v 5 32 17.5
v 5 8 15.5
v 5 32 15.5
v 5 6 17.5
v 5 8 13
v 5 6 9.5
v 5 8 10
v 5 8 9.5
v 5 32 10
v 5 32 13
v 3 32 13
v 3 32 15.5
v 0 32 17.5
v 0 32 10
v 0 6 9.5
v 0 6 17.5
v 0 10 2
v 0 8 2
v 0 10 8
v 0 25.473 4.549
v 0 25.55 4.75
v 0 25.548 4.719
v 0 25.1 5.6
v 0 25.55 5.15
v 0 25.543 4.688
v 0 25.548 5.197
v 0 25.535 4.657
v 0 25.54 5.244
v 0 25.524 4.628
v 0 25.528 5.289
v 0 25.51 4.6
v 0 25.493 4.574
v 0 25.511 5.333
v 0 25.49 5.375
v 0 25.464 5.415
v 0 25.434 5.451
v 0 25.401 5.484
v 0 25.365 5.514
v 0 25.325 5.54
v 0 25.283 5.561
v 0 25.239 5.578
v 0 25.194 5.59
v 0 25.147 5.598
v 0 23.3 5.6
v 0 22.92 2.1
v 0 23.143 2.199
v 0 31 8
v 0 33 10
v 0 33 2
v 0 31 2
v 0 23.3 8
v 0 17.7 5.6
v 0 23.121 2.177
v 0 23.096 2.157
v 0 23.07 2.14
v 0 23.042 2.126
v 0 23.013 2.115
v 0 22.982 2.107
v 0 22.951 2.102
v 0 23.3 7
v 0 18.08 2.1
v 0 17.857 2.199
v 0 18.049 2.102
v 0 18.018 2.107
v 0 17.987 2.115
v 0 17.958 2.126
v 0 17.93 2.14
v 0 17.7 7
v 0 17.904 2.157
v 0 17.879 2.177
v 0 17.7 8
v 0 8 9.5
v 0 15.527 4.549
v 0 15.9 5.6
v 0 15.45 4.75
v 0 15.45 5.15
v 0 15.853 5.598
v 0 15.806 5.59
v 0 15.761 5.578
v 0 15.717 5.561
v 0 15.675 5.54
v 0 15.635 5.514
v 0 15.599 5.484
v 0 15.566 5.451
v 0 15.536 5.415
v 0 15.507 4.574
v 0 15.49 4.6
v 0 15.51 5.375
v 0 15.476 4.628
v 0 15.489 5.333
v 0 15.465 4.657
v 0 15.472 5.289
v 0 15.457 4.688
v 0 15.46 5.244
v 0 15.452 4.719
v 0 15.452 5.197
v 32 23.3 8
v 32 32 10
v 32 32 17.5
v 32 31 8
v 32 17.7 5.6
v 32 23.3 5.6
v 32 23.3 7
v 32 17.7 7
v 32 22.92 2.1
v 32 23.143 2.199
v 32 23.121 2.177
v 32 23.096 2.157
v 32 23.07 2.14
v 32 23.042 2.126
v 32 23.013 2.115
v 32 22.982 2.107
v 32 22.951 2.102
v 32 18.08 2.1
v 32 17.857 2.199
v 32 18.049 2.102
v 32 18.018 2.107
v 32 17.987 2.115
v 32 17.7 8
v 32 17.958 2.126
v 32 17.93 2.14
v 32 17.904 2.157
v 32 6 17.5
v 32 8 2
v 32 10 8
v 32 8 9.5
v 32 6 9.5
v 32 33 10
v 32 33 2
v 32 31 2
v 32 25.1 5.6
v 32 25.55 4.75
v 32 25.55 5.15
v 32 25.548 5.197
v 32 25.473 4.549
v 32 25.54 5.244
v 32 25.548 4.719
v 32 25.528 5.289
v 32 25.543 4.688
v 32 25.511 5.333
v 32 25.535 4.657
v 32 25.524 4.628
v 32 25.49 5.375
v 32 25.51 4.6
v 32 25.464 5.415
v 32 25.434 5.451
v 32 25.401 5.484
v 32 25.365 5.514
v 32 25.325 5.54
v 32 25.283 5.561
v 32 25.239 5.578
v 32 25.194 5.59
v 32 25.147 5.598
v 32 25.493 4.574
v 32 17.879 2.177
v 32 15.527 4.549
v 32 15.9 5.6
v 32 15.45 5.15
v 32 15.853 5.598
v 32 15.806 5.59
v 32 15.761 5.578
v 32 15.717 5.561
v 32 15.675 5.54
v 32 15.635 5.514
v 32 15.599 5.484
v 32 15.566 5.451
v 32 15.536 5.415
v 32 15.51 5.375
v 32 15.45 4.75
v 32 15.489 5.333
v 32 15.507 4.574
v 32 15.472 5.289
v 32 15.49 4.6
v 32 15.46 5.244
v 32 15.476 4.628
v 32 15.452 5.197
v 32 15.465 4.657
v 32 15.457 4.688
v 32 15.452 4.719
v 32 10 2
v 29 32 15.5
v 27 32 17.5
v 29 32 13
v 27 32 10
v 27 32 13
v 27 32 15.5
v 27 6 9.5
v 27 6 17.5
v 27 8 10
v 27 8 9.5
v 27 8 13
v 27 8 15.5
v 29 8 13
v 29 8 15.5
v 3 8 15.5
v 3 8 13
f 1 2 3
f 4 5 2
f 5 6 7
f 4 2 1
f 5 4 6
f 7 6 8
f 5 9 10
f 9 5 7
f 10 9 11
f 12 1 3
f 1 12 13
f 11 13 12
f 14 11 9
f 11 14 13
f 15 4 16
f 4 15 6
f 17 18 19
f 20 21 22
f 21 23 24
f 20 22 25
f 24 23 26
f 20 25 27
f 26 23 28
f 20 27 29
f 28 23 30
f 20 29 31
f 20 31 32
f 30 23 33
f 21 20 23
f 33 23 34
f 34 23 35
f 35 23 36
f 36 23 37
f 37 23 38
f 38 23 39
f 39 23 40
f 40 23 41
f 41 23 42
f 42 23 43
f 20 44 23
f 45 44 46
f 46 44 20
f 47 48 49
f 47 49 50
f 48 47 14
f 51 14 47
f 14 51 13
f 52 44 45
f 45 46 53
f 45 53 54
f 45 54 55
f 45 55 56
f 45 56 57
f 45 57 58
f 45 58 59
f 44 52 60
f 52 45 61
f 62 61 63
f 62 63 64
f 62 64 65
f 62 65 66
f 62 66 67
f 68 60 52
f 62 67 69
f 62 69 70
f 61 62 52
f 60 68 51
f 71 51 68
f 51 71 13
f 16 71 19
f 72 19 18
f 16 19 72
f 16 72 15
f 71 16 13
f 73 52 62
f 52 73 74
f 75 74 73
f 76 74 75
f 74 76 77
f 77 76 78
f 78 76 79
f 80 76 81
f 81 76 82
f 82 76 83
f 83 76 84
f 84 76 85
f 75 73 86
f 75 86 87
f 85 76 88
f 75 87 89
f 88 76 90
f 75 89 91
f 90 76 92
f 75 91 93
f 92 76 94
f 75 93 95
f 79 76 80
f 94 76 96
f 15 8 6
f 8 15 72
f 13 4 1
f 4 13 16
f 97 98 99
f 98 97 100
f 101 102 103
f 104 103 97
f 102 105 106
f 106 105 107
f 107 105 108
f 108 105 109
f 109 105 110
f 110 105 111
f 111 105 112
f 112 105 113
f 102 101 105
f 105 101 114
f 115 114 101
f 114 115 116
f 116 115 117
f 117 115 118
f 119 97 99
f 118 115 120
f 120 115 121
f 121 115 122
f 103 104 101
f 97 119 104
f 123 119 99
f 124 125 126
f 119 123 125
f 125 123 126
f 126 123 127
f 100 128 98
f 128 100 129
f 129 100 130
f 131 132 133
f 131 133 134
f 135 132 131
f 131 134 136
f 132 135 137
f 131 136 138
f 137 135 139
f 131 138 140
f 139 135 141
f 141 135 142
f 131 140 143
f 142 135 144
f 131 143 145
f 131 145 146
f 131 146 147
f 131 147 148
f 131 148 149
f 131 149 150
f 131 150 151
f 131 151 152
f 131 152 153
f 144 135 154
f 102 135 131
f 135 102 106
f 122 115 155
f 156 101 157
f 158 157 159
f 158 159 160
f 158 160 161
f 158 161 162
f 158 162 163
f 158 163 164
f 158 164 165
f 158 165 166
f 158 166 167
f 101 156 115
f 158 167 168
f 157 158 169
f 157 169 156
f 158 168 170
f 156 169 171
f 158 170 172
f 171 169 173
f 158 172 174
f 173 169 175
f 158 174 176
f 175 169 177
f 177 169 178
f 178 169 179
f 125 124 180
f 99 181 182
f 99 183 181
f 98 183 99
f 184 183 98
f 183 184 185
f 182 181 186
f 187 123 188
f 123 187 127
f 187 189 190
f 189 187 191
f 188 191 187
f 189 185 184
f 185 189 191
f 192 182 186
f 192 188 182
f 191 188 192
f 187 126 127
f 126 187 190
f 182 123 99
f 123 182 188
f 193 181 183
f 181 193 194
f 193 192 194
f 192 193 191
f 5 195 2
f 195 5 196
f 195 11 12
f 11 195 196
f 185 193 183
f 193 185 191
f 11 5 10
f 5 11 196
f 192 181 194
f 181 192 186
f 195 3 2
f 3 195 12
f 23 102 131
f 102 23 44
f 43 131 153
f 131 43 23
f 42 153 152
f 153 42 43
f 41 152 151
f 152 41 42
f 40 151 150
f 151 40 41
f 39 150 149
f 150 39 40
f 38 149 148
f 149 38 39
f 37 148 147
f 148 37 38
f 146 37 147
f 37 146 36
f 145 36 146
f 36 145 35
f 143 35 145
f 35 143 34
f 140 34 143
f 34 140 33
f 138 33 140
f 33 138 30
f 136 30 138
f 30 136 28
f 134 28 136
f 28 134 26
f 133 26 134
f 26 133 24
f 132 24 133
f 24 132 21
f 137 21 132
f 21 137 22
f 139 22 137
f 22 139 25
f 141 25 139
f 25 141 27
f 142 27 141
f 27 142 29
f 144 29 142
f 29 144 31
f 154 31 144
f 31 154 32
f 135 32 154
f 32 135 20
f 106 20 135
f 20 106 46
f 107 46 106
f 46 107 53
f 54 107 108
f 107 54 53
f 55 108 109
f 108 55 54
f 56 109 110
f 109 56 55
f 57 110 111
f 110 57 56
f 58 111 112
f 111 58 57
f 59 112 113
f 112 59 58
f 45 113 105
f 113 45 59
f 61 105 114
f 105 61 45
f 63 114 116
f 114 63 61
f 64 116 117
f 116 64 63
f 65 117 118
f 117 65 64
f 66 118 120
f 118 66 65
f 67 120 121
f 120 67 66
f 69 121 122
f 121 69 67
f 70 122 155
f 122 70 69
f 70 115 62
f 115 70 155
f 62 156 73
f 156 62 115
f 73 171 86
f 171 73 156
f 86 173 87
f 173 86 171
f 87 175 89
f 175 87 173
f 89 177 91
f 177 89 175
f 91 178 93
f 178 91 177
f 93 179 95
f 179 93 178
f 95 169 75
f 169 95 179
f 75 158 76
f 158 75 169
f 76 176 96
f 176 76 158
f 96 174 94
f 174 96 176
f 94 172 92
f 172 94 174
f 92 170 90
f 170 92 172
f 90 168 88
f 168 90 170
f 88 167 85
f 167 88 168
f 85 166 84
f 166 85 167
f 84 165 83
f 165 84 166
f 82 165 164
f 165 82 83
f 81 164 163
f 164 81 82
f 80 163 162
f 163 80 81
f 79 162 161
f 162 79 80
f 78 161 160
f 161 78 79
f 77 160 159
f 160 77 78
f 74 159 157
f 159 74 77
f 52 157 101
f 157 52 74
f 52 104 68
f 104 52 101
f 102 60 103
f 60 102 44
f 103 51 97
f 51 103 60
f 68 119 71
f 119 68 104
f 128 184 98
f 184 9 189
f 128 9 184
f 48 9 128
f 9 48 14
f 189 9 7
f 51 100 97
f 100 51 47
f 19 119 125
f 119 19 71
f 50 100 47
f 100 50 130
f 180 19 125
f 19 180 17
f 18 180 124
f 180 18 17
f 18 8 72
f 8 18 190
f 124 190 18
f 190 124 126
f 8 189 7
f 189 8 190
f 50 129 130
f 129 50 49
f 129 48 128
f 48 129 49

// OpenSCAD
/*
To Use by Step.

1. Chose type by comment out.
2. Render(F6)
3. Export STL(F7)

*/

// ------------------------------------------
// Select one for Joint Type!
// basic
// type="single";
// for Real Device Tap System
// type="frame_200";
// type="frame_100";
// type="frame_70";
// type="single_taphole";
// type="twin";
// type="twin_ex";
// type="triple_right";
// type="triple_left";
// type="plate_75";
// type="plate_90";
// type="plate_90_ex";
// type="back_plate";
// type="back_plate_0";
// type="shaft_holder";
// type="shaft_cap";
// type="shaft_cap2";
// for TPU fill
// type="ajaster";
// type="hole_twin";
// type="hole_single";
// for Option
// type="single_long";
// type="single_3hock";
// type="frame_200";
// type="alt_parts";
// type="moni_parts";
// type="moni_parts_top";
type="moni_parts_camera";

// ------------------------------------------

echo(version=version());
// Base Config
base_W = 14;
base_H = 14;
base_T = 5;
$fn = 60;

if (type=="single") {
    make_single_cap();
} else if (type=="twin") {
    make_single_cap(0);
    translate([0, -10, -10]) rotate([90, 180, 0]) make_single_cap(0);
    hull(){
        translate([0, 0, -3]) linear_extrude(height=1) make_2D_base();
        translate([0, -7, -10]) rotate([90, 180, 0]) linear_extrude(height=1) make_2D_base();
    }
} else if (type=="twin_ex") {
    make_single_cap(0);
    translate([0, -17, -10]) rotate([90, 180, 0]) make_single_cap(0);
    hull(){
        translate([0, 0, -3]) linear_extrude(height=1) make_2D_base();
        translate([0, -7, -10]) rotate([90, 180, 0]) linear_extrude(height=1) make_2D_base();
    }
    hull(){
        translate([0, -7, -10]) rotate([90, 180, 0]) linear_extrude(height=1) make_2D_base();
        #translate([0, -14, -10]) rotate([90, 180, 0]) linear_extrude(height=1) make_2D_base();
    }
} else if (type=="triple_right") {
    make_single_cap(0);
    translate([0, -10, -10]) rotate([90, 180, 0]) make_single_cap(0);
    translate([12.6, 0, -9.65]) rotate([0, -75, 180]) make_single_cap();
    hull(){
        translate([0, 0, -3]) linear_extrude(height=1) make_2D_base();
        translate([0, -7, -10]) rotate([90, 180, 0]) linear_extrude(height=1) make_2D_base();
        translate([9.5, 0, -10.5]) rotate([0, -75, 180]) linear_extrude(height=1) make_2D_base();
    }
} else if (type=="triple_left") {
    make_single_cap(0);
    translate([0, -10, -10]) rotate([90, 180, 0]) make_single_cap(0);
    translate([-12.6, 0, -9.65]) rotate([0, -75, 0]) make_single_cap();
    hull(){
        translate([0, 0, -3]) linear_extrude(height=1) make_2D_base();
        translate([0, -7, -10]) rotate([90, 180, 0]) linear_extrude(height=1) make_2D_base();
        translate([-9.5, 0, -10.5]) rotate([0, -75, 0]) linear_extrude(height=1) make_2D_base();
    }
} else if (type=="plate_75") {
    make_plate(75,-2.075,-4.225,-2.6,-0.3);
} else if (type=="plate_90") {
    make_plate(90);
} else if (type=="plate_90_ex") {
    make_plate(90,0,0,0,0,7);
} else if (type=="single_long") {
    make_single_cap(0,20,20,20);
} else if (type=="single_3hock") {
    make_single_cap(0);
} else if (type=="single_taphole") {
    difference(){
        make_single_cap(0, 15, 0, 15);
        translate([0, 0, -8]) cylinder(h=10, r=2.6);
        translate([0, 0, -8]) cylinder(h=5, r=4.6);
        hull(){
            translate([0, 0, -4]) cylinder(h=0.1, r=4.6);
            translate([0, 0, -5.1]) cylinder(h=0.1, r=5.6);
        }
    }

} else if (type=="back_plate") {
    union() {
        depth=7;
        translate([0, 0, depth]) difference(){
            cube([20, 70, 3]);
            union() {
                // holes
                translate([10, 10, -0.5]) cylinder(h=4, r=3.2);
                translate([10, 60, -0.5]) cylinder(h=4, r=3.2);
            }
        }
        translate([120, 0, depth]) difference(){
            cube([20, 70, 3]);
            union() {
                // holes
                translate([10, 10, -0.5]) cylinder(h=4, r=3.2);
                translate([10, 60, -0.5]) cylinder(h=4, r=3.2);
            }
        }

        translate([20, 0, 0]) cube([3, 70, 3+depth]);
        translate([117, 0, 0]) cube([3, 70, 3+depth]);

        difference(){
            // main body
            translate([20, 0, 0]) cube([100, 70, 3]);

            //pattern block
            translate([0, 0, 0]) make_hole_pattern(5);
            translate([10, 10, 0]) make_hole_pattern(4);
            translate([0, 20, 0]) make_hole_pattern(5);
            translate([10, 30, 0]) make_hole_pattern(4);
            translate([0, 40, 0]) make_hole_pattern(5);
        }
        // hock block
        translate([80, 0, 0]) make_hock();
        translate([32, 0, 0]) make_hock();
    }
} else if (type=="back_plate_0") {
    union() {
        depth=0;
        translate([0, 0, depth]) difference(){
            cube([20, 70, 3]);
            union() {
                // holes
                translate([10, 10, -0.5]) cylinder(h=4, r=3.2);
                translate([10, 60, -0.5]) cylinder(h=4, r=3.2);
            }
        }
        translate([120, 0, depth]) difference(){
            cube([20, 70, 3]);
            union() {
                // holes
                translate([10, 10, -0.5]) cylinder(h=4, r=3.2);
                translate([10, 60, -0.5]) cylinder(h=4, r=3.2);
            }
        }

        translate([20, 0, 0]) cube([3, 70, 3+depth]);
        translate([117, 0, 0]) cube([3, 70, 3+depth]);

        difference(){
            // main body
            translate([20, 0, 0]) cube([100, 70, 3]);

            //pattern block
            translate([0, 0, 0]) make_hole_pattern(5);
            translate([10, 10, 0]) make_hole_pattern(4);
            translate([0, 20, 0]) make_hole_pattern(5);
            translate([10, 30, 0]) make_hole_pattern(4);
            translate([0, 40, 0]) make_hole_pattern(5);
        }
    }
} else if (type=="shaft_holder") {
    union(){
        // main body
        translate([0, 0, -0.5]) difference(){
            union(){
                // base plate
                translate([0, 0, 0]) cube([39, 20, 1.5], center=true);
                // fill body
                hull() {
                    translate([0, 0, 9.8]) cube([22, 20, 0.1], center=true);
                    translate([0, 0, 0.5]) cube([16, 20, 0.1], center=true);
                }
                // shaft caps
                translate([-13.5, 0, 0]) union(){
                    make_shaft_cap();
                    translate([27, 0, 0]) make_shaft_cap();
                }
            }
            // center hole
            translate([0, 0, -3]) cylinder(h=22, r=3.4);
        }
        // dabo
        translate([-12, 0, -1]) make_DABO();
        translate([12, 0, -1]) make_DABO();
    }
} else if (type=="frame_70") {
    make_frame(height=70);
} else if (type=="frame_100") {
    make_frame(height=100);
} else if (type=="frame_200") {
    make_frame(height=200);
} else if (type=="ajaster") {
    make_ajaster();
} else if (type=="shaft_cap") {
    union(){
        difference() {
            union(){
                translate([0, 0, 0.7]) cube([20,15,13], center=true);
                translate([0, 13.5, 0]) difference() {
                    hull(){
                        translate([0, -6, 0.7]) cube([20,0.1,13], center=true);
                        translate([0, 0, 0]) rotate([90, 0, 90]) cylinder(h=17, r=5.8, center=true);
                    }
                    translate([0, 0, 0]) rotate([90, 0, 90]) cylinder(h=32, r=3.2, center=true);
                }
                translate([0, -13.5, 0]) difference() {
                    hull(){
                        translate([0, 6, 0.7]) cube([20,0.1,13], center=true);
                        translate([0, 0, 0]) rotate([90, 0, 90]) cylinder(h=17, r=5.8, center=true);
                    }
                    translate([0, 0, 0]) rotate([90, 0, 90]) cylinder(h=32, r=3.2, center=true);
                }
            }
            translate([0, 0, 0.7]) union(){
                cylinder(h=15, r=2.6, center=true);
                translate([0, 0, -2]) cylinder(h=11, r=7.7, center=true);
            }
        }
    }
} else if (type=="shaft_cap2") {
    union(){
        difference() {
            union(){
                translate([0, 0, 0.7]) cube([20,15,13], center=true);
                translate([0, 13.5, 0]) difference() {
                    hull(){
                        translate([0, -6, 0.7]) cube([20,0.1,13], center=true);
                        translate([0, 0, 0]) rotate([90, 0, 90]) cylinder(h=17, r=5.8, center=true);
                    }
                    translate([0, 0, 0]) rotate([90, 0, 90]) cylinder(h=32, r=3.4, center=true);
                }
                translate([0, -13.5, 0]) difference() {
                    hull(){
                        translate([0, 6, 0.7]) cube([20,0.1,13], center=true);
                        translate([0, 0, 0]) rotate([90, 0, 90]) cylinder(h=17, r=5.8, center=true);
                    }
                    translate([0, 0, 0]) rotate([90, 0, 90]) cylinder(h=32, r=3.4, center=true);
                }
                translate([0, 0, 5.7]) cube([10,24,3], center=true);
            }

                translate([0, 7, 0.7]) union(){
                    cylinder(h=15, r=2.8, center=true);
                    translate([0, 0, -6]) cylinder(h=2, r=7.7, center=true);
                }
                translate([0, -7, 0.7]) union(){
                    cylinder(h=15, r=2.8, center=true);
                    translate([0, 0, -6]) cylinder(h=2, r=7.7, center=true);
                }
                translate([0, 0, -5.8]) cube([15.4,15,3], center=true);
                translate([0, 0, 2]) cube([5.6,15,13], center=true);

        }
    }} else if (type=="hole_twin") {
    // twin type
    translate([0, 0, 0]) union(){
        difference() {
            // main body
            intersection(){
                translate([0, 0, 0]) cube([base_H*2-3, base_W, base_T], center=true);
                union(){
                    translate([6, 0, 0]) cylinder(r=8.5, h=7, center=true);
                    translate([-6, 0, 0]) cylinder(r=8.5, h=7, center=true);
                    translate([0, 0, 0]) cube([base_H+2, base_W+2, base_T+2], center=true);
                }
            }
            // hole
            translate([7, 0, -0.5]) padhole();
            translate([-6, -1.2, -0.5]) rotate([0, 0, 90]) padhole();
        }
        translate([0, 0, 2]) make_ajaster();
    }
} else if (type=="hole_single") {
    // single type
    translate([0, 0, 0]) union(){
        difference() {
            // main body
            intersection(){
                cube([base_H, base_W, base_T], center=true);
                cylinder(r=8.5, h=7, center=true);
            }
            // hole
            translate([0, 0, -0.5]) padhole();
        }
        translate([0, 0, 2]) make_ajaster();
    }
} else if (type=="moni_parts") {
    // monitor holder
    translate([14,20.5,-2.2]) rotate([-90,0,90]) linear_extrude(height=14){
        make_2D_tSlot_inner();
    }
    translate([0,17.7,7]) cube([14,5.6,2]);
    union(){
        difference(){
            cube([14,31,10]);
            rotate([-15,0,0]) translate([1,3,3]) cube([12,2,9]);
            translate([-1,10,-2]) cube([16,22,10]);
        }
        *translate([0,31,2]) cube([14,2,8]);
    }
} else if (type=="moni_parts_top") {
    // monitor holder
    translate([14,20.5,-2.2]) rotate([-90,0,90]) linear_extrude(height=14){
        make_2D_tSlot_inner();
    }
    translate([0,17.7,7]) cube([14,5.6,2]);
    // main body
    translate([0,10,8]) cube([14,21,2]);
    translate([0,8,2]) cube([14,2,8]);
    translate([0,31,2]) cube([14,2,8]);
    // sub body
    difference(){
        translate([0,5,10]) cube([14,12,4]);
        translate([1,4,11]) cube([12,12,2]);
    }
} else if (type=="moni_parts_camera") {
    union(){
        // monitor holder
        translate([32,20.5,-2.2]) rotate([-90,0,90]) linear_extrude(height=32){
            make_2D_tSlot_inner();
        }
        translate([0,17.7,7]) cube([32,5.6,2]);
        // main body
        translate([0,10,8]) cube([32,21,2]);
        translate([0,8,2]) cube([32,2,8]);
        translate([0,31,2]) cube([32,2,8]);
        // camera holder
        translate([0,5,17.5]) rotate([-90,0,0]) difference(){
            union(){
                translate([0,0,1]) cube([5,8,26]);
                translate([27,0,1]) cube([5,8,26]);
            }
            translate([3,2,3]) cube([26,2.5,29]);
        }
    }
} else {
    color("red",0.5) cube(10,center=true);
}




// ------------------------------------------
// module block
// ------------------------------------------
// 2D module

module make_2D_tSlot_inner() {
    translate([0, -7.5, 0]) square([5.6,5],center=true);
    hull(){
        translate([4.6, -7.35, 0]) circle(0.45);
        translate([-4.6, -7.35, 0]) circle(0.45);
        translate([4.75, -6.95, 0]) circle(0.3);
        translate([-4.75, -6.95, 0]) circle(0.3);
        translate([2.42, -4.6, 0]) circle(0.3);
        translate([-2.42, -4.6, 0]) circle(0.3);
    }
}

module make_2D_diff_inner() {
    make_2D_tSlot_inner();
    rotate([0, 0, 90]) make_2D_tSlot_inner();
    rotate([0, 0, 180]) make_2D_tSlot_inner();
    rotate([0, 0, -90]) make_2D_tSlot_inner();
}

module make_2D_base() {
    translate([0, 0, 0]) square([20,18],center=true);
    translate([0, 9.1, 0]) rotate([0, 0, 90]) square([1.8,18],center=true);
    translate([0, -9.1, 0]) rotate([0, 0, 90]) square([1.8,18],center=true);
    translate([9.1, 0, 0]) square([1.8,18],center=true);
    translate([9.1, 0, 0]) square([1.8,18],center=true);
    translate([9, 9, 0]) circle(1);
    translate([-9, -9, 0]) circle(1);
    translate([9, -9, 0]) circle(1);
    translate([-9, 9, 0]) circle(1);
}

module make_2D_tSlot() {
    translate([0, -7.5, 0]) square([6.4,5],center=true);
    hull(){
        translate([5, -7.75, 0]) circle(0.45);
        translate([-5, -7.75, 0]) circle(0.45);
        translate([5.15, -6.55, 0]) circle(0.3);
        translate([-5.15, -6.55, 0]) circle(0.3);
        translate([2.82, -4.2, 0]) circle(0.3);
        translate([-2.82, -4.2, 0]) circle(0.3);
    }
}

module make_2D_diff() {
    circle(2.5);
    make_2D_tSlot();
    rotate([0, 0, 90]) make_2D_tSlot();
    rotate([0, 0, 180]) make_2D_tSlot();
    rotate([0, 0, -90]) make_2D_tSlot();
}

module make_2D_frame() {
    difference(){
        make_2D_base();
        make_2D_diff();
    }
}

// ------------------------------------------
// 3D module

module make_frame(height=10) {
    linear_extrude(height=height) {
        make_2D_frame();
    }
}

module make_single_cap(p1=7,p2=7,p3=7,p4=7,ch=3) {
    linear_extrude(height=p1) make_2D_tSlot_inner();
    linear_extrude(height=p2)  rotate([0, 0, 90]) make_2D_tSlot_inner();
    linear_extrude(height=p3)  rotate([0, 0, 180]) make_2D_tSlot_inner();
    linear_extrude(height=p4)  rotate([0, 0, -90]) make_2D_tSlot_inner();
    translate([0, 0, -3])
        hull(){
            linear_extrude(3) make_2D_base();
            translate([0, 0, -2]) scale(0.8) linear_extrude(1) make_2D_base();
        }
}

// ------------------------------------------
// other module

module plate() {
    difference(){
        translate([0, 0, 0]) cube([20, 3, 30],center=true);
        translate([0, 0, -6.5]) rotate([90, 0, 0]) cylinder(h=4, r=3.2, center=true);
    }
}

module make_plate(dig, offset_x=0, offset_z=0, hoffset_x=0, hoffset_z=0, ex=0) {
    translate([10, 0, -15-ex]) plate();
    translate([offset_x, 0, offset_z]) translate([-15, 0, 10]) rotate([0, dig, 0]) plate();
    hull() {
        translate([10, 0, 0]) cube([20,3,0.1], center=true);
        translate([0+hoffset_x, 0, 10+hoffset_z]) rotate([0, dig, 0]) cube([20,3,0.1], center=true);
    }
    if (ex>0) {
        translate([10, 0, -(ex/2)]) cube([20,3,ex], center=true);
    }
}

module make_hock() {
    translate([20, 0, 0]) cube([10, 3, 20]);
    translate([20, 0, 17]) cube([10, 13, 3]);
}

module make_hole_sq() {
    rotate([0, 0, 45]) cube([10, 10, 4], center=true);
}

module make_hole_pattern(num) {
    for ( i = [1 : num] ){
        x = 10 + (20 * i);
        translate([x, 15, 1.5]) make_hole_sq();
    }
}

module make_shaft_cap() {
    difference(){
        hull(){
            cube([12, 20, 0.1], center=true);
            translate([0, 0, 5]) rotate([90, 90, 0]) cylinder(h=20, r=6, center=true);
        }
        translate([0, 5, 5]) rotate([90, 90, 0]) cylinder(h=16, r=3.2);
        translate([0, 0, -1]) cube([25, 22, 3], center=true);
    }
}

module make_DABO() {
    hull(){
        translate([0, 0, 0]) cube([10, 5.4, 0.1], center=true);
        translate([0, 0, -2.5]) cube([8, 3.4, 0.1], center=true);
    }
}

module padhole() {
    cube([7.8, 11.3, 4.5], center=true);
}

module holderhock(){
    cylinder(r=4.8, h=3, center=false);
}

module make_ajaster(){
    difference(){
        hull(){
            translate([0, 0, 0]) cylinder(h=0.1, r=6.5);
            translate([0, 0, 1]) cylinder(h=6, r=7.5);
            translate([0, 0, 8]) cylinder(h=0.1, r=6.5);
        }
        translate([0, 0, 3]) cylinder(h=6, r=4.3);
    }
    cylinder(h=6.5, r=1.9, $fn = 6);
}
